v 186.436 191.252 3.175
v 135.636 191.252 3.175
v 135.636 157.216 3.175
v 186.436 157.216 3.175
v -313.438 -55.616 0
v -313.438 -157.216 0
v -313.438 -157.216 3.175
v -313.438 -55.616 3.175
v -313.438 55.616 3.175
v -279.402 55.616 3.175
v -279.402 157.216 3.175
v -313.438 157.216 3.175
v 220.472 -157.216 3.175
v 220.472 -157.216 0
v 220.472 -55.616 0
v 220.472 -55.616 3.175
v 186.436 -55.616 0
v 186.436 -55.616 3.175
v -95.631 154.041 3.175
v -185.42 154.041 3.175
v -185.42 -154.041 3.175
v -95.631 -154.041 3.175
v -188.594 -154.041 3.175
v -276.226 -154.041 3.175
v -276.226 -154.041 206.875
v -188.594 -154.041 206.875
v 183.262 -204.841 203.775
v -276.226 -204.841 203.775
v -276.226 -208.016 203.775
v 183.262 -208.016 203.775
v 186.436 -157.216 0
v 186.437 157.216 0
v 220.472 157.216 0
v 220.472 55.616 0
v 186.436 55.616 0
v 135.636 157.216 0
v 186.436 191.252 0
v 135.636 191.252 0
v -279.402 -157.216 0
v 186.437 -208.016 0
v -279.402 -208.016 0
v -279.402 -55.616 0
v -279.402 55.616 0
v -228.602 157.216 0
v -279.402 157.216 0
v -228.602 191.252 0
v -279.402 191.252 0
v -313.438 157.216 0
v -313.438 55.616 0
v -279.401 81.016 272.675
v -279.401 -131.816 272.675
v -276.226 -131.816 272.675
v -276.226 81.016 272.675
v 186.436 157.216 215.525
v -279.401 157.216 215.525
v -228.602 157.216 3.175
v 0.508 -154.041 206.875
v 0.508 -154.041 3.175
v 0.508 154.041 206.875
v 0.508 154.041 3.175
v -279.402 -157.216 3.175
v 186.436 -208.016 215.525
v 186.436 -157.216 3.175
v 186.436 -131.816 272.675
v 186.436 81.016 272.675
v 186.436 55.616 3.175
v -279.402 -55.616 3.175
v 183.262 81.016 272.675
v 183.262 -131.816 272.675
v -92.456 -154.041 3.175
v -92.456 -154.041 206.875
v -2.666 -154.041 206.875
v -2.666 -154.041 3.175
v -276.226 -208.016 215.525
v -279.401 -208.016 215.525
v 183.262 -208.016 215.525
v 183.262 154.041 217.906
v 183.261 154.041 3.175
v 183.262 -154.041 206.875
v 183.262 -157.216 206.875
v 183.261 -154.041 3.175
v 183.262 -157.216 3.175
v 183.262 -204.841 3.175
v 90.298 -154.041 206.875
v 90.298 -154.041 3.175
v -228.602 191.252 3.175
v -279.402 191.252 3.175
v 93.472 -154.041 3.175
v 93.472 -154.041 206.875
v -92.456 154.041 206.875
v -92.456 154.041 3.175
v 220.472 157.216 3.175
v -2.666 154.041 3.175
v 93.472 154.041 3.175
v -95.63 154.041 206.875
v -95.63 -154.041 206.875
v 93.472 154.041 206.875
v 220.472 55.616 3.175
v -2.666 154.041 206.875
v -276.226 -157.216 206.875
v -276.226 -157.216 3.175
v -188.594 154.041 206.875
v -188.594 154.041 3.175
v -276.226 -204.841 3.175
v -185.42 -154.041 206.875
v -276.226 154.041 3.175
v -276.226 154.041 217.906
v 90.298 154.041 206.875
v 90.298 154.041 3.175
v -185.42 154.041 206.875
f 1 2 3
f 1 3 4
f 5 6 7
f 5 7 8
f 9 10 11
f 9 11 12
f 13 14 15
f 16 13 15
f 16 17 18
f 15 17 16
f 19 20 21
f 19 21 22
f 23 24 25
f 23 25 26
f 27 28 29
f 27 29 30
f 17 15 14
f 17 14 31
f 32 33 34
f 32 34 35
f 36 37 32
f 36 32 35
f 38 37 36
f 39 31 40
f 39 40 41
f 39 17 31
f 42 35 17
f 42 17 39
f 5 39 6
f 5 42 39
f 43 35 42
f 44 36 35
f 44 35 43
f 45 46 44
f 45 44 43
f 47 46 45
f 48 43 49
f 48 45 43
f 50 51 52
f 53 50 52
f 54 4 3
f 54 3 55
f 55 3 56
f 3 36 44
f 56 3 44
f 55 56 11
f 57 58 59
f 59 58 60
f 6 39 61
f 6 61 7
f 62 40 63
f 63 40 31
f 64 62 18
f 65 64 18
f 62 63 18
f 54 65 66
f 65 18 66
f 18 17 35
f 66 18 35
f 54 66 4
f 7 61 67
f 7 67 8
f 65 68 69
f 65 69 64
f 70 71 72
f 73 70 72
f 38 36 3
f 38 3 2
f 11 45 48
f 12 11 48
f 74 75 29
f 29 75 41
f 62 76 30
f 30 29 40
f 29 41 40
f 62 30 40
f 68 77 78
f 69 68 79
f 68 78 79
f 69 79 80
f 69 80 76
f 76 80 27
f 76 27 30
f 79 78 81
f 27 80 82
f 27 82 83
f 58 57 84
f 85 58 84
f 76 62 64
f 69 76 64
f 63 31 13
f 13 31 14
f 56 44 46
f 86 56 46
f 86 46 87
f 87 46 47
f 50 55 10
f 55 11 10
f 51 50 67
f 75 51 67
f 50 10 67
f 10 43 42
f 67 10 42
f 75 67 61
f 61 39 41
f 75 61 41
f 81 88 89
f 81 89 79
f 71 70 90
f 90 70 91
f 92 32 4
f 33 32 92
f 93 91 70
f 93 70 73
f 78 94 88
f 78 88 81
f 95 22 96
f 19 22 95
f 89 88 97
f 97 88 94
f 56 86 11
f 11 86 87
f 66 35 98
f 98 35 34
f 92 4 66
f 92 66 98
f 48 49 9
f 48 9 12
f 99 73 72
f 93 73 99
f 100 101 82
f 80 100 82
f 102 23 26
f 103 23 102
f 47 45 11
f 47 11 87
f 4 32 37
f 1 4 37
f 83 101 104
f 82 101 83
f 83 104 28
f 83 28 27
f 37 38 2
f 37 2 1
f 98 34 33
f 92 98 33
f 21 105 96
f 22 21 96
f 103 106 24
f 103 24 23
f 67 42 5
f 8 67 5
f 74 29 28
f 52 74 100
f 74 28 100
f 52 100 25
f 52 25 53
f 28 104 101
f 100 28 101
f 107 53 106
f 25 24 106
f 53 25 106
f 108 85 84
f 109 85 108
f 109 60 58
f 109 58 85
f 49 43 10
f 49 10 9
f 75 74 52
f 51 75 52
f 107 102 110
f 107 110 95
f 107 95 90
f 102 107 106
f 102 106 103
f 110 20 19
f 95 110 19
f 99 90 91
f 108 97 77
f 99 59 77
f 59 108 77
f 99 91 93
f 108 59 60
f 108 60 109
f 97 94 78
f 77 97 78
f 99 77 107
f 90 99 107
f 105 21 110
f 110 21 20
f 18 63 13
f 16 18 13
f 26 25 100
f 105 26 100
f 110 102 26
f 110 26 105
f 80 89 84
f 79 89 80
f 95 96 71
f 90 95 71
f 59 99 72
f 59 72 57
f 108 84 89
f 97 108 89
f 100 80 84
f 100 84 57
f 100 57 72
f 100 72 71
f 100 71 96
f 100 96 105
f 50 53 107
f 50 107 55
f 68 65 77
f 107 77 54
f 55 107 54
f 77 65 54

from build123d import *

# Parameters (mm, degrees)
SKETCH1_W           = 465.838
SKETCH1_H           = 365.232
BOSS_EXTRUDE1_DEPTH = 3.175
SKETCH2_W           = 465.838
SKETCH2_H           = 365.232
SKETCH2_W_2         = 89.789
SKETCH2_H_2         = 308.082
SKETCH2_W_3         = 87.632
SKETCH2_W_4         = 459.488
SKETCH2_H_3         = 47.625
BOSS_EXTRUDE2_DEPTH = 200.6
SKETCH5_W           = 89.789
SKETCH5_H           = 308.082
SKETCH5_W_2         = 87.632
BOSS_EXTRUDE5_DEPTH = 38.1
CUT_EXTRUDE2_DEPTH  = 35
BOSS_EXTRUDE6_DEPTH = 30.8
CUT_EXTRUDE3_DEPTH  = 579.469838561
SKETCH10_W          = 34.036
SKETCH10_H          = 101.6
SKETCH10_W_2        = 50.8
SKETCH10_H_2        = 34.036
BOSS_EXTRUDE7_DEPTH = 3.175


with BuildPart() as part:
    # Sketch1 → Boss-Extrude1 (new body)
    with BuildSketch(Plane.XY):
        with Locations((-46.4825, -25.4)):
            Rectangle(SKETCH1_W, SKETCH1_H)
    extrude(amount=BOSS_EXTRUDE1_DEPTH)

    # Sketch2 → Boss-Extrude2 (add)
    with BuildSketch(Plane.XY.offset(3.175)):
        with Locations((-46.4825, -25.4)):
            Rectangle(SKETCH2_W, SKETCH2_H)
        with Locations((138.367, 0)):
            Rectangle(SKETCH2_W_2, SKETCH2_H_2, mode=Mode.SUBTRACT)
        with Locations((45.403, 0)):
            Rectangle(SKETCH2_W_2, SKETCH2_H_2, mode=Mode.SUBTRACT)
        with Locations((-47.561, 0)):
            Rectangle(SKETCH2_W_2, SKETCH2_H_2, mode=Mode.SUBTRACT)
        with Locations((-140.525, 0)):
            Rectangle(SKETCH2_W_2, SKETCH2_H_2, mode=Mode.SUBTRACT)
        with Locations((-232.4105, 0)):
            Rectangle(SKETCH2_W_3, SKETCH2_H_2, mode=Mode.SUBTRACT)
        with Locations((-46.4825, -181.0285)):
            Rectangle(SKETCH2_W_4, SKETCH2_H_3, mode=Mode.SUBTRACT)
    extrude(amount=BOSS_EXTRUDE2_DEPTH)

    # Sketch5 → Boss-Extrude5 (add)
    with BuildSketch(Plane.XY.offset(203.775)):
        Polygon((186.4365, 157.216), (-279.4015, 157.216), (-279.4015, -208.016), (-276.2265, -208.016), (-276.2265, -157.216), (183.2615, -157.216), (183.2615, -208.016), (186.4365, -208.016), align=None)
        with Locations((-140.525, 0)):
            Rectangle(SKETCH5_W, SKETCH5_H, mode=Mode.SUBTRACT)
        with Locations((-47.561, 0)):
            Rectangle(SKETCH5_W, SKETCH5_H, mode=Mode.SUBTRACT)
        with Locations((45.403, 0)):
            Rectangle(SKETCH5_W, SKETCH5_H, mode=Mode.SUBTRACT)
        with Locations((138.367, 0)):
            Rectangle(SKETCH5_W, SKETCH5_H, mode=Mode.SUBTRACT)
        with Locations((-232.4105, 0)):
            Rectangle(SKETCH5_W_2, SKETCH5_H, mode=Mode.SUBTRACT)
    extrude(amount=BOSS_EXTRUDE5_DEPTH)

    # Sketch7 → Cut-Extrude2 (cut)
    with BuildSketch(Plane.XY.offset(241.875)):
        Polygon((-95.6305, -154.041), (-185.4195, -154.041), (-185.4195, 154.041), (-188.5945, 154.041), (-188.5945, -154.041), (-276.2265, -154.041), (-276.2265, -157.216), (183.2615, -157.216), (183.2615, -154.041), (93.4725, -154.041), (93.4725, 154.041), (90.2975, 154.041), (90.2975, -154.041), (0.5085, -154.041), (0.5085, 154.041), (-2.6665, 154.041), (-2.6665, -154.041), (-92.4555, -154.041), (-92.4555, 154.041), (-95.6305, 154.041), align=None)
    extrude(amount=-CUT_EXTRUDE2_DEPTH, mode=Mode.SUBTRACT)

    # Sketch8 → Boss-Extrude6 (add)
    with BuildSketch(Plane.XY.offset(241.875)):
        Polygon((183.2615, 154.041), (183.2615, -208.016), (186.4365, -208.016), (186.4365, 157.216), (-279.4015, 157.216), (-279.4015, -208.016), (-276.2265, -208.016), (-276.2265, 154.041), align=None)
    extrude(amount=BOSS_EXTRUDE6_DEPTH)

    # Sketch9 → Cut-Extrude3 (cut, through all)
    with BuildSketch(Plane(origin=(186.4365, 0, 0), x_dir=(0, 0, -1), z_dir=(1, 0, 0))):
        Polygon((-272.675, -208.016), (-215.525, -208.016), (-272.675, -131.816), align=None)
        Polygon((-272.675, 157.216), (-272.675, 81.016), (-215.525, 157.216), align=None)
    extrude(amount=-CUT_EXTRUDE3_DEPTH, mode=Mode.SUBTRACT)

    # Sketch10 → Boss-Extrude7 (add)
    with BuildSketch(Plane.XY):
        with Locations((203.4545, 106.416)):
            Rectangle(SKETCH10_W, SKETCH10_H)
        with Locations((161.0365, 174.234)):
            Rectangle(SKETCH10_W_2, SKETCH10_H_2)
        with Locations((203.4545, -106.416)):
            Rectangle(SKETCH10_W, SKETCH10_H)
    boss_extrude7 = extrude(amount=BOSS_EXTRUDE7_DEPTH)

    # Mirror1: Boss-Extrude7 across plane
    add(boss_extrude7.mirror(Plane.ZY.offset(46.4825)))


solid = part.part
